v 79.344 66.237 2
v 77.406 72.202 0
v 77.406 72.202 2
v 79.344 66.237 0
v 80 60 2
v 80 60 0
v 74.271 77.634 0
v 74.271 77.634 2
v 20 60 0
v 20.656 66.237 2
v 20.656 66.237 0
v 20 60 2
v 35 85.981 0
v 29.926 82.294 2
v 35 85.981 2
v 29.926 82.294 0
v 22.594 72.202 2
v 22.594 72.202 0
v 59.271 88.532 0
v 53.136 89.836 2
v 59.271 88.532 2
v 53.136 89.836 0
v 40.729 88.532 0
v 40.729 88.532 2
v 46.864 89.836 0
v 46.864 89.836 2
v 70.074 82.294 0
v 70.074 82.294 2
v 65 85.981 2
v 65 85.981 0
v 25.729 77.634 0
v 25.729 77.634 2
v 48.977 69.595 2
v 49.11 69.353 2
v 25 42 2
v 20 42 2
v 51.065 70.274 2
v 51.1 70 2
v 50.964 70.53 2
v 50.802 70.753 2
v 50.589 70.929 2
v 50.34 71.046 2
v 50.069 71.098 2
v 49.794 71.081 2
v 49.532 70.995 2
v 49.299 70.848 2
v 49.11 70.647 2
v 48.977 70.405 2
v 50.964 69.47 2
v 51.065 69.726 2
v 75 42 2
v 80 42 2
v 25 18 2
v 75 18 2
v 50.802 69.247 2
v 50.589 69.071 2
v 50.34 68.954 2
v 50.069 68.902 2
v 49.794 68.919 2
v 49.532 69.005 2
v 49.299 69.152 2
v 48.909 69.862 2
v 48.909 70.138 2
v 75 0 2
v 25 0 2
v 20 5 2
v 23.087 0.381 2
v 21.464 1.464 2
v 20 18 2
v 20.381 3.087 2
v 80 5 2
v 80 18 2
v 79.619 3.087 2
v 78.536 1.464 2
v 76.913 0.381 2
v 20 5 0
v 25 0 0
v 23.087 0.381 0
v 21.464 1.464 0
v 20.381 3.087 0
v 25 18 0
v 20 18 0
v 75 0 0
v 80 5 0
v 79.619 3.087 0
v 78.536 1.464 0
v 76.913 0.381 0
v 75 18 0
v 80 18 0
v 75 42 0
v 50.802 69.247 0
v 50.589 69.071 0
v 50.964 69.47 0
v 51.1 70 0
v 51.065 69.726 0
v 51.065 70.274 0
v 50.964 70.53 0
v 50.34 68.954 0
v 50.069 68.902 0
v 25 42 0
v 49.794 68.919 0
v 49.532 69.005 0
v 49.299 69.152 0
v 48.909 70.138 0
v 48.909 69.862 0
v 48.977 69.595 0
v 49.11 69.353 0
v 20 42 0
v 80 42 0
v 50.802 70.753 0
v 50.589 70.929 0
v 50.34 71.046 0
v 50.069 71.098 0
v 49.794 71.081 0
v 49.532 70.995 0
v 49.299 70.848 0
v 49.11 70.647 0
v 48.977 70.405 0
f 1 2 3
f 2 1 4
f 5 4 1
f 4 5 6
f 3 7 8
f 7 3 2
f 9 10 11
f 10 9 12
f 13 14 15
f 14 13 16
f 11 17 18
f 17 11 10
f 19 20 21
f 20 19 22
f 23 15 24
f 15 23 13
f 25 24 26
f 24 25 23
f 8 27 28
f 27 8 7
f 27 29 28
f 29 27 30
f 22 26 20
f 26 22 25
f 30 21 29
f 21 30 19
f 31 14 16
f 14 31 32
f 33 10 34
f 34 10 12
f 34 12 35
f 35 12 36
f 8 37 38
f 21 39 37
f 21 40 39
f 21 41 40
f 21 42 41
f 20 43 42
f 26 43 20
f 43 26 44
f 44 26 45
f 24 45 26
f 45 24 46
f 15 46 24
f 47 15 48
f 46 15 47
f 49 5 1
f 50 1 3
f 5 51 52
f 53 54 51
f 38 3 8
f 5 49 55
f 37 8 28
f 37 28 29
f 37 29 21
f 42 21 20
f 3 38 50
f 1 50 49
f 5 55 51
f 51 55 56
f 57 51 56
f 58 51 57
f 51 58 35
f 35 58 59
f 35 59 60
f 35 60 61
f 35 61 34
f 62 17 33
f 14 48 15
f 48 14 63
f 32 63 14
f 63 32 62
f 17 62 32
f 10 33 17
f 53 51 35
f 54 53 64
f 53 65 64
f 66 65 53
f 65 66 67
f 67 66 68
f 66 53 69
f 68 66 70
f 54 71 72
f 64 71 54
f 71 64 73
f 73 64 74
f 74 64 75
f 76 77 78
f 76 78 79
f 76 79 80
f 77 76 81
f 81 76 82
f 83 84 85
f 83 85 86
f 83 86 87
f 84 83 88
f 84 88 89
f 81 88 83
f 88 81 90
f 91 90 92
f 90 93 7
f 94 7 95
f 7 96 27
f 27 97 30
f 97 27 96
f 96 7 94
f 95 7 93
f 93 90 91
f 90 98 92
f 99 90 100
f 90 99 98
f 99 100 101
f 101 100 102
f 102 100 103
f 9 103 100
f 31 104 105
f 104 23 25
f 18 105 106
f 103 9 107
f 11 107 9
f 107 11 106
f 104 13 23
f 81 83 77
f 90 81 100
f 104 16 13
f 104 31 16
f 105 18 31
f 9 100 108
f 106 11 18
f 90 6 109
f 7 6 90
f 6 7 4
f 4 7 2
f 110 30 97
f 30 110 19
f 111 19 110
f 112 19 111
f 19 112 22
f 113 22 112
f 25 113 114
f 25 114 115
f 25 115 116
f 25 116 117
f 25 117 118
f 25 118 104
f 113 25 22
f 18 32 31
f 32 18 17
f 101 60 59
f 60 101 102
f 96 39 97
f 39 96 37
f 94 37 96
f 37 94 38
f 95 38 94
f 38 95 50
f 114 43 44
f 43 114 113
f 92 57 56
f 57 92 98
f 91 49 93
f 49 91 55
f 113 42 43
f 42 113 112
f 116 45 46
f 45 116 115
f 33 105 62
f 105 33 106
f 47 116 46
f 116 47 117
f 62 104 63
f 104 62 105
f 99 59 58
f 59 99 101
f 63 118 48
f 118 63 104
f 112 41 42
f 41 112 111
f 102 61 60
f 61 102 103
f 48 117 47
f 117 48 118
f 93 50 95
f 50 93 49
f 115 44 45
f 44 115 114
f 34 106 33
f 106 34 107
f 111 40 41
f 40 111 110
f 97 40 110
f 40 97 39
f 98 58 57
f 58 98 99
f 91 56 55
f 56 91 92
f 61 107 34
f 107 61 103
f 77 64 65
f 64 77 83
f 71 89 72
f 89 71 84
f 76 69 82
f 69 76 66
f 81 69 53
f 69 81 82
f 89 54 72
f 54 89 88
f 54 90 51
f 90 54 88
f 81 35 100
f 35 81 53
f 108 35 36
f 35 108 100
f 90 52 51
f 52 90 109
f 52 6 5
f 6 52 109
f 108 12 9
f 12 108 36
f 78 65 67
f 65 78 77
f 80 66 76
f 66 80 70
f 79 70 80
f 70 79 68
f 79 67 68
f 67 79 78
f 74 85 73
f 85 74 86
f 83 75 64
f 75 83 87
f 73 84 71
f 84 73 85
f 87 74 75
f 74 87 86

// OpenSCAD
module mouse_body(){

    h = 2; //PCB height

    // main body
    translate([25, 0,0]){
        cube([50,5,h]);
    }
    translate([20, 5,0]){
        cube([60,13,h]);
    }
    translate([25, 18,0]){
        cube([50,24,h]);
    }
    translate([20, 42,0]){
        cube([60,18,h]);
    }
    // rounded edges
    module rounded_edge(){
        cylinder(h,5,5);
    }
    translate([25, 5,0]){
        //circle(5);
        rounded_edge();
    }
    translate([75, 5,0]){
        //circle(5);
        rounded_edge();
    }
    
    // top
    difference(){
        translate([50,60,0]){
            //circle(30);
            cylinder(h,30,30);
        }
        translate([50,70,0]){
            $fn=25;
            cylinder(4,1.1,1.1);
        }
    }
}
mouse_body();
